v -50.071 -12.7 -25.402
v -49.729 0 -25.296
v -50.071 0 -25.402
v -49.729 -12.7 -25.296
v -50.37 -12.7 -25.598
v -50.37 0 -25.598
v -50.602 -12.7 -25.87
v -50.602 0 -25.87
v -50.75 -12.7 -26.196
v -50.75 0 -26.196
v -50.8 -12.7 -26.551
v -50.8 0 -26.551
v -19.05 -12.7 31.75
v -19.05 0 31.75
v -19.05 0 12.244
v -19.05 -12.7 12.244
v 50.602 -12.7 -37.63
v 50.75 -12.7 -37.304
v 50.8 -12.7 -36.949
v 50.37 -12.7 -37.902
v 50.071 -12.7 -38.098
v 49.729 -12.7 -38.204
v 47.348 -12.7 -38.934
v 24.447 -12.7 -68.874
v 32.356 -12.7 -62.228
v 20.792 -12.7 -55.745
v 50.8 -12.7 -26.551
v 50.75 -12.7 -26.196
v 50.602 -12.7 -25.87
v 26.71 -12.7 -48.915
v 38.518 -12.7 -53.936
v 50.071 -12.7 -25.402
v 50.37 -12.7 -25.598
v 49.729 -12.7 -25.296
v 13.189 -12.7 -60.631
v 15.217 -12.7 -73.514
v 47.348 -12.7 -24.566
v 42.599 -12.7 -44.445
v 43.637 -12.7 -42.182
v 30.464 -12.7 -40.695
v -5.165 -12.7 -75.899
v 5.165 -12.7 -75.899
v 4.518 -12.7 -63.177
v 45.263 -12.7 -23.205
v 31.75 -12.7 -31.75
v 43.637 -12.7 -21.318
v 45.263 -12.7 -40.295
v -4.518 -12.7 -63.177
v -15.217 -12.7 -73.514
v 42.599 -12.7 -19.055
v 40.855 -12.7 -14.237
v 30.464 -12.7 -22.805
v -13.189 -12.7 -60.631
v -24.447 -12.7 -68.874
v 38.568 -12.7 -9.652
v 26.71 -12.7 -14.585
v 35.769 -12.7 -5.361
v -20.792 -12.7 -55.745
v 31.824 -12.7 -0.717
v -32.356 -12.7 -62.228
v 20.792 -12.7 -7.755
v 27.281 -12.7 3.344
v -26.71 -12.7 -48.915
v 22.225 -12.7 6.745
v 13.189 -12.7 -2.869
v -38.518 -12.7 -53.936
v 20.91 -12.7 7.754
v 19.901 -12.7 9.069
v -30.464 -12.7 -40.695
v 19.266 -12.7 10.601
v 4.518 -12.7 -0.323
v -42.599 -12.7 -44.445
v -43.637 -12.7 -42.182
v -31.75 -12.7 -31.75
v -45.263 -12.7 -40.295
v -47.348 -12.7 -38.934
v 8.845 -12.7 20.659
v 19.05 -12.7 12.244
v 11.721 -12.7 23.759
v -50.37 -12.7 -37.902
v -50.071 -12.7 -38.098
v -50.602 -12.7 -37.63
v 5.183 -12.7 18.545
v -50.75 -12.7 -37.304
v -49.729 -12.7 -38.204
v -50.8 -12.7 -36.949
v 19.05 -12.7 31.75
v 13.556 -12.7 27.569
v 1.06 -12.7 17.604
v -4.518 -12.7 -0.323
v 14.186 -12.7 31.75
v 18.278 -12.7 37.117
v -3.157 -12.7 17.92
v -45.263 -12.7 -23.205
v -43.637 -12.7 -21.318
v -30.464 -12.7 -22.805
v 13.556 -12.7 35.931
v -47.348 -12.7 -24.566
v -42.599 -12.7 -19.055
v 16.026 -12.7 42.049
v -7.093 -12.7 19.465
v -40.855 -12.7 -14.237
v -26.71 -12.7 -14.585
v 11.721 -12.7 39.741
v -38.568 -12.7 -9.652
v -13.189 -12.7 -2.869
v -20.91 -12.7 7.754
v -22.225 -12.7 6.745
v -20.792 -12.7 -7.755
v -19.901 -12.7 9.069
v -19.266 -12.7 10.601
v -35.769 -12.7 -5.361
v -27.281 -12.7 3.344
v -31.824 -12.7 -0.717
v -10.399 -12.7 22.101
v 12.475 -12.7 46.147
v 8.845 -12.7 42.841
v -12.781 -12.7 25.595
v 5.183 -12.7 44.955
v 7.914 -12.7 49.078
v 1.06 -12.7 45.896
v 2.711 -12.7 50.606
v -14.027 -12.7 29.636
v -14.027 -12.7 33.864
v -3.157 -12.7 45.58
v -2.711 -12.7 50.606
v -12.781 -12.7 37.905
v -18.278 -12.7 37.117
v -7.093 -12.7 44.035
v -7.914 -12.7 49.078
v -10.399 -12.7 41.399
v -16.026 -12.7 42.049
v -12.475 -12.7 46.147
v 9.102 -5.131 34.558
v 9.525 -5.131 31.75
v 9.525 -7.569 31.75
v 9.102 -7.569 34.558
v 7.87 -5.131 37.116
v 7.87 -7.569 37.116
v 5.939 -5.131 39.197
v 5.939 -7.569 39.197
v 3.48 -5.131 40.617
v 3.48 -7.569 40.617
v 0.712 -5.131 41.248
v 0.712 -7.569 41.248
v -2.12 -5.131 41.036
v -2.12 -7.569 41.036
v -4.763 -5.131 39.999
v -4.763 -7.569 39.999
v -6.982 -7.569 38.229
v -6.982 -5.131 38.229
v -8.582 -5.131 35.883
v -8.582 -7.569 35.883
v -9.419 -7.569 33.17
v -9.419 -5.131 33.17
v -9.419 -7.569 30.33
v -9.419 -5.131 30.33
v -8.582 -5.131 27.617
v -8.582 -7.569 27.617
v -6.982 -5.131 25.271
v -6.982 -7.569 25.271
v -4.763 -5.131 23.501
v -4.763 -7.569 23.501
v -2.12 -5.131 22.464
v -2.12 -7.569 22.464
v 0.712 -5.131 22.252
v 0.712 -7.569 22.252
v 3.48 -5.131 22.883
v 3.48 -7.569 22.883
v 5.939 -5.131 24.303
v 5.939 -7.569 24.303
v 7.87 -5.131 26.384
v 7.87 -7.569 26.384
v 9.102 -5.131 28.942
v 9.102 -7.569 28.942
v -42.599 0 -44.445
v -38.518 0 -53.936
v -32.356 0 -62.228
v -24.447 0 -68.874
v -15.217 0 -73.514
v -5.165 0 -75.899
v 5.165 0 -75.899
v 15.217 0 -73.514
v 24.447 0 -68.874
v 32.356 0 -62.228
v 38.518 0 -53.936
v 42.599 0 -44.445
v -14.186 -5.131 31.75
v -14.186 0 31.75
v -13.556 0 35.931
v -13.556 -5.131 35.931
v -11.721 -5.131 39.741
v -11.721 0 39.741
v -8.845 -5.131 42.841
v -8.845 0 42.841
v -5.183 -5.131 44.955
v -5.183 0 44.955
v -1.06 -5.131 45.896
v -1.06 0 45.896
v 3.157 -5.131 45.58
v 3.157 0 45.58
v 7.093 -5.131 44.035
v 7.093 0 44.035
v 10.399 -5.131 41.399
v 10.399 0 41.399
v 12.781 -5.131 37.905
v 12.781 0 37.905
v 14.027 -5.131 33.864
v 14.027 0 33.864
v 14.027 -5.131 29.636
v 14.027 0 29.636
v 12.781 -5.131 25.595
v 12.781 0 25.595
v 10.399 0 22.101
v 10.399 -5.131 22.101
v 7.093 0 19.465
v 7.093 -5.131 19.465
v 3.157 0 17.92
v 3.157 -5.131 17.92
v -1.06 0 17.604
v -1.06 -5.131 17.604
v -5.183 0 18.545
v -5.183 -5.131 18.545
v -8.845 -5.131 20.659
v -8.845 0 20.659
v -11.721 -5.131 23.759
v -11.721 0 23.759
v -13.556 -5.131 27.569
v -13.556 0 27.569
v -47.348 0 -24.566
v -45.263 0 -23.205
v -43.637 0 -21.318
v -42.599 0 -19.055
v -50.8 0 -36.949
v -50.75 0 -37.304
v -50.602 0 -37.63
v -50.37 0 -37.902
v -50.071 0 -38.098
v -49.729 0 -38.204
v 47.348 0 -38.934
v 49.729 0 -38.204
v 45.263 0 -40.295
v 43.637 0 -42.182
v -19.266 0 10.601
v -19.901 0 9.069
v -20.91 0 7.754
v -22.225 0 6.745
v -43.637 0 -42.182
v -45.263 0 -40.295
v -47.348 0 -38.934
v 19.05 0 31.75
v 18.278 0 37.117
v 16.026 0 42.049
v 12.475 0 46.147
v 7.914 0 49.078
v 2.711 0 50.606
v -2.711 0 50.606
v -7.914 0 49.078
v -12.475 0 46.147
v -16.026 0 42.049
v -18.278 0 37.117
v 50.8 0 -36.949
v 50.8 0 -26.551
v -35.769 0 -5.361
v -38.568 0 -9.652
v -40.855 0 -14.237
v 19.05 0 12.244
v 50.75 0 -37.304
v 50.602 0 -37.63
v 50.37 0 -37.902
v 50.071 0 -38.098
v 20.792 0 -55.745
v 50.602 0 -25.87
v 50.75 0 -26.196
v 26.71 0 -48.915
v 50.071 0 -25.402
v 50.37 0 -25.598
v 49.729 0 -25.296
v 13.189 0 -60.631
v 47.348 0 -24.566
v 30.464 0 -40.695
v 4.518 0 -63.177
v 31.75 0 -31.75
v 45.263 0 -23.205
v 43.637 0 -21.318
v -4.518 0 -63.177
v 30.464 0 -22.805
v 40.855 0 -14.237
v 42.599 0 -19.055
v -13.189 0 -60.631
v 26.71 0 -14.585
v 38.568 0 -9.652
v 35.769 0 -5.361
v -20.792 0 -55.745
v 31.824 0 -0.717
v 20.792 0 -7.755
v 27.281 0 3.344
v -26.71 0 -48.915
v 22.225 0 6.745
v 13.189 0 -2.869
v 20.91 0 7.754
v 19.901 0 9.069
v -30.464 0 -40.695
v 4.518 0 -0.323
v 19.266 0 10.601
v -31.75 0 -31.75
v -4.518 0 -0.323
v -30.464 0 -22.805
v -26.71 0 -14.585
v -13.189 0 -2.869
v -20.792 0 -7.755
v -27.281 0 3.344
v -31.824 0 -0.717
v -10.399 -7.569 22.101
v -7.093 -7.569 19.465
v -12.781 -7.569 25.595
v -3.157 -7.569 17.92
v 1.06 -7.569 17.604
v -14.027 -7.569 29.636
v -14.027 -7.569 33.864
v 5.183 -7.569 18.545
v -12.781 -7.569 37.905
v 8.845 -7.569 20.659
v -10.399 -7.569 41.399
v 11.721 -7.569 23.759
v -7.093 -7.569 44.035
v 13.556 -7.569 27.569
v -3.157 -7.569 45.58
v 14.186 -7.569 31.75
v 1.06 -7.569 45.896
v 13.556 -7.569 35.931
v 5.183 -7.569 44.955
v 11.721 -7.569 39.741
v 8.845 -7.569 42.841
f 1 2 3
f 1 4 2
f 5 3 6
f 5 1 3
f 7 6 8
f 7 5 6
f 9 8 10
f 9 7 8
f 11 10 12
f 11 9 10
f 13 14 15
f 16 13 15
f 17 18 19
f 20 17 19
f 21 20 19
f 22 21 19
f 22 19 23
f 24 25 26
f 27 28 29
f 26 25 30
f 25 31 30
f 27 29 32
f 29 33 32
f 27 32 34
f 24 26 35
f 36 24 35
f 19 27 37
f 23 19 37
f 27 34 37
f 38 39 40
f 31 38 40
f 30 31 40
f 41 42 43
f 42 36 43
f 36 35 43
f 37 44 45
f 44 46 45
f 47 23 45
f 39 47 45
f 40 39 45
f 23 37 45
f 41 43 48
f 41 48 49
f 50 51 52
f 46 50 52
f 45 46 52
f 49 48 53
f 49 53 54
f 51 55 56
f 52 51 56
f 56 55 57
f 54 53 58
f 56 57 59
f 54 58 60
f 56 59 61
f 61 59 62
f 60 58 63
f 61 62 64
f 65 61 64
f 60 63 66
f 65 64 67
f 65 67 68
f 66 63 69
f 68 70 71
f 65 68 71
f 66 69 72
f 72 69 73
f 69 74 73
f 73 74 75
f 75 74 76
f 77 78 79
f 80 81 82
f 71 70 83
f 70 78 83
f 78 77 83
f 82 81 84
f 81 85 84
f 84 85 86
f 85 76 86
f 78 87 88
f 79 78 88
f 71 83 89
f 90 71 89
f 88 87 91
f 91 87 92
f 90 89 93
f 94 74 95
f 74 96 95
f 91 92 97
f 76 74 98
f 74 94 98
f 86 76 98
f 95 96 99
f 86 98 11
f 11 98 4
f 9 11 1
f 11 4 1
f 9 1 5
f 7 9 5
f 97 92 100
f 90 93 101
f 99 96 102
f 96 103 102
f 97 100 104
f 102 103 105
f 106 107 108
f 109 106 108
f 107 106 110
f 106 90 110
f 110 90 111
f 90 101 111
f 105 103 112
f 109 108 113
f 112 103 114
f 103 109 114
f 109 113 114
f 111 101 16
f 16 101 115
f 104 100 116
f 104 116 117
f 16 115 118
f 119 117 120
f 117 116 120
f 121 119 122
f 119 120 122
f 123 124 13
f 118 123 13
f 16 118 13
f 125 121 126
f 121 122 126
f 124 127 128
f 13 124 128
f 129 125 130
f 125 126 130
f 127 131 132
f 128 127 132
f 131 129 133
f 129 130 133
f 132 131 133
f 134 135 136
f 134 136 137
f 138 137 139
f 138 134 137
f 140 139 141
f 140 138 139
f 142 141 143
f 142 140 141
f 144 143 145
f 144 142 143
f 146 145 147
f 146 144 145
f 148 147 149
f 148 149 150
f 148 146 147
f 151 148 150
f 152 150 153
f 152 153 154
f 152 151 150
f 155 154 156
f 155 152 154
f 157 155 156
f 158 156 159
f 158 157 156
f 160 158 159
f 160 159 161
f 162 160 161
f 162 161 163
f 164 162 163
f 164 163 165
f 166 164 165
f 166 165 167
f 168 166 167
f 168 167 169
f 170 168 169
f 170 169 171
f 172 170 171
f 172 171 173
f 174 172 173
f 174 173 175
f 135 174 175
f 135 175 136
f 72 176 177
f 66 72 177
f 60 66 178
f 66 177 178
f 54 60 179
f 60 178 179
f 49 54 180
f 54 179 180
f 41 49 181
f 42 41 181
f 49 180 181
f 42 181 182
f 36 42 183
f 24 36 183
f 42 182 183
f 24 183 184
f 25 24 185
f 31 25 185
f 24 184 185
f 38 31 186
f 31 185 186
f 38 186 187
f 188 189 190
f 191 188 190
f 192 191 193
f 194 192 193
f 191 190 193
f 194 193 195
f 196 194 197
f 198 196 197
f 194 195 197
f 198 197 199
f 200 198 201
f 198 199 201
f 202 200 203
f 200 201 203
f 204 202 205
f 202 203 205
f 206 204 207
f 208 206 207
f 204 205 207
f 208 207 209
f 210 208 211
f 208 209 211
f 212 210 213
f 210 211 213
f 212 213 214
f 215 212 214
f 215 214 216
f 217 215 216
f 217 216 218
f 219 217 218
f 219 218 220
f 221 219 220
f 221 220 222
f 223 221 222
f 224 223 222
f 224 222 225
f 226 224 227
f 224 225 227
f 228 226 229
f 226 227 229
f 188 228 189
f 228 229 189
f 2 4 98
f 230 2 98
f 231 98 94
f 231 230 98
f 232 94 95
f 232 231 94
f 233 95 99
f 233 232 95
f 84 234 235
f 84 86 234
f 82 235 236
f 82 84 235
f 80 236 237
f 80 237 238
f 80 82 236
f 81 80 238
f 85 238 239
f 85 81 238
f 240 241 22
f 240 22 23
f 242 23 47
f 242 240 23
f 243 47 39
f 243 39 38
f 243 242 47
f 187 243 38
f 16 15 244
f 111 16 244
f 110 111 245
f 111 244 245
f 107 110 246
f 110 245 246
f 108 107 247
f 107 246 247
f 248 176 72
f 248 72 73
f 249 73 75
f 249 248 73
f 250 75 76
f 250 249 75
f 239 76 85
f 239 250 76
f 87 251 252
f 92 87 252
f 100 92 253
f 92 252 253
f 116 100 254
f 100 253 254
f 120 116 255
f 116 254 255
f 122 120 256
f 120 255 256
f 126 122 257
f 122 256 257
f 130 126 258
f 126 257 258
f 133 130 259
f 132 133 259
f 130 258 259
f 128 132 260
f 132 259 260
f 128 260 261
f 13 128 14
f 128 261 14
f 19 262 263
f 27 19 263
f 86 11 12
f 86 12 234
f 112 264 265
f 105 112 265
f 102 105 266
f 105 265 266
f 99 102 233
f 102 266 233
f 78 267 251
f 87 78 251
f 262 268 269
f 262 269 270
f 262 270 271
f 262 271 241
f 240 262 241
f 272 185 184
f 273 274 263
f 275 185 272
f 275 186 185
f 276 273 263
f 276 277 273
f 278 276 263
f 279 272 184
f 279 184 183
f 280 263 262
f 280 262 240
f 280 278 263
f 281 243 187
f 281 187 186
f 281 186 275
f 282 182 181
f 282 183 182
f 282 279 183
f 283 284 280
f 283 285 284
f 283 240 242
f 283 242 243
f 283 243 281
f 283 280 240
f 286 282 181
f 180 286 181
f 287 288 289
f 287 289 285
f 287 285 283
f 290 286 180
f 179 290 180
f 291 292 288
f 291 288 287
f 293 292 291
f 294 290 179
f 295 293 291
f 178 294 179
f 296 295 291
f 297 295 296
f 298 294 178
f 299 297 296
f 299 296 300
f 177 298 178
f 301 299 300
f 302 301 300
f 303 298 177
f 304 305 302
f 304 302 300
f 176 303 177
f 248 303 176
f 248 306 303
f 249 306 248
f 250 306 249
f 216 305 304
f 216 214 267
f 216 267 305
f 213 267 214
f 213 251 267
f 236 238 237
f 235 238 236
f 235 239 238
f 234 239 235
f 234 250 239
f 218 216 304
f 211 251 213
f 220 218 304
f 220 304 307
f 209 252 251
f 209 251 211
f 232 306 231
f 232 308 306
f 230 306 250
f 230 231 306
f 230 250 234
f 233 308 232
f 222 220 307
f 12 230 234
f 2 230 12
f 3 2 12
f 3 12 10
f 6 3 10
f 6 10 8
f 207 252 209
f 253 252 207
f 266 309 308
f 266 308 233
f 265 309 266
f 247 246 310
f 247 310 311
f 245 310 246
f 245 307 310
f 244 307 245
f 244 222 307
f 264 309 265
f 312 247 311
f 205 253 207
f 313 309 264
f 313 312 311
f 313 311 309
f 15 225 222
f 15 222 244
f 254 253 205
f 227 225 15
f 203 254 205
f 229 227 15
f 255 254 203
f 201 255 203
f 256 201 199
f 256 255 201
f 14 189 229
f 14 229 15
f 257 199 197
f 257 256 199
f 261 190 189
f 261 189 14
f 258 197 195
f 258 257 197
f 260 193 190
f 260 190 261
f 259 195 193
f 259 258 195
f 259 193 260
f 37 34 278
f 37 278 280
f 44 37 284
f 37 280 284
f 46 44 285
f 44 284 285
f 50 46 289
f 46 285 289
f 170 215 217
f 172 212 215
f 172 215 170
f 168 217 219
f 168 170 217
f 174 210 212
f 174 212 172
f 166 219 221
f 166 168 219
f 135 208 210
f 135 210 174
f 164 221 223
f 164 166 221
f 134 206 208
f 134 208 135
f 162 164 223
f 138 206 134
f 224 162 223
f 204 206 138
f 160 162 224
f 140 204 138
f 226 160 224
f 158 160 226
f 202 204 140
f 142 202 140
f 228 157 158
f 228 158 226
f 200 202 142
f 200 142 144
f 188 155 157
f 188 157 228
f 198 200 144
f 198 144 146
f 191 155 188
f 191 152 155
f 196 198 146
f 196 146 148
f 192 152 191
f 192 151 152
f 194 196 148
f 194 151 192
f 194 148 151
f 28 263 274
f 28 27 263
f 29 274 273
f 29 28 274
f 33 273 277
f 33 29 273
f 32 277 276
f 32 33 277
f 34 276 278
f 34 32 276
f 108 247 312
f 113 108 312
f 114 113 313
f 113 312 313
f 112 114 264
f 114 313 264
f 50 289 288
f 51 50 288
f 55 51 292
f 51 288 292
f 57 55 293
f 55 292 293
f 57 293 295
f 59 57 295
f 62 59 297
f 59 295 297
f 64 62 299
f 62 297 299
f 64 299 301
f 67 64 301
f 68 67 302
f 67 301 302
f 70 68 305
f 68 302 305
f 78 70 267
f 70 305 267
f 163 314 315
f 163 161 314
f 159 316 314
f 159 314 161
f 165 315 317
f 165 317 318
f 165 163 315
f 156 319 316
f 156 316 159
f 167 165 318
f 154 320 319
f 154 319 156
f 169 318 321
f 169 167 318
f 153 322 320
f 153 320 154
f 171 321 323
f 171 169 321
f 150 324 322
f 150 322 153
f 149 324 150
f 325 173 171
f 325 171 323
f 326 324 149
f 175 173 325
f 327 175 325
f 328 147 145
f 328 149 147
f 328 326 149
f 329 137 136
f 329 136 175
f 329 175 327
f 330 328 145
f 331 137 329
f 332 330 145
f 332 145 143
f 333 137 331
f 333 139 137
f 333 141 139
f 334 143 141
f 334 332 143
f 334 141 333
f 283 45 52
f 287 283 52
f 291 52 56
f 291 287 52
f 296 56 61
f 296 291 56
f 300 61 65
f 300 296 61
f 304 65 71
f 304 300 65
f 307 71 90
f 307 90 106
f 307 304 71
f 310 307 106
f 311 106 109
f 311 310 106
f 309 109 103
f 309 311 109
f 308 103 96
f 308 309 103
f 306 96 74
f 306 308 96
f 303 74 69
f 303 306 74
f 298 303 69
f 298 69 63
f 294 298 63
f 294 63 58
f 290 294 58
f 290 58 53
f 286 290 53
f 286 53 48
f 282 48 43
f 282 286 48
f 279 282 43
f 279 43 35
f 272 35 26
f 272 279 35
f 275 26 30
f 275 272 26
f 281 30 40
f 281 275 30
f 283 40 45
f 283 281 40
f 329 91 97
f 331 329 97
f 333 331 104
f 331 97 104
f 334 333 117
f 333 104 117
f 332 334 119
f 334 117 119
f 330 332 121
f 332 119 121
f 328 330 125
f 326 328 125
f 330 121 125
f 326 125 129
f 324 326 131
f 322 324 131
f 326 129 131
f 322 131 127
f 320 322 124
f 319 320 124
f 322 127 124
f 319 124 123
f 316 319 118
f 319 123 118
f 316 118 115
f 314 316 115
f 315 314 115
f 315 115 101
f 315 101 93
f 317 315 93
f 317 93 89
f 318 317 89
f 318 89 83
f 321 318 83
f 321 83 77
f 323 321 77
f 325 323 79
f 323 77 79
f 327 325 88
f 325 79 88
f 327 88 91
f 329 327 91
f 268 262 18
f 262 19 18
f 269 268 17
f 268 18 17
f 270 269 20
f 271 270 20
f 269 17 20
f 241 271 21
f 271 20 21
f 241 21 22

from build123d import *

# Parameters (mm, degrees)
F0_R        = 31.75
F0_R_2      = 9.525
F1_DEPTH    = 12.7
F2_T1_DEPTH = 12.7
F3_R        = 1.27
F4_R        = 14.1859
F4_R_2      = 9.525
F5_DEPTH    = 5.1308
F6_R        = 14.1859
F6_R_2      = 9.525
F7_DEPTH    = 5.1308


# Not quite as in the source:
# - a fillet or chamfer that OpenCascade refuses, or shapes differently, is made with other operations: its cross-section is extruded or revolved along the edge and cut away or added


with BuildPart() as f1:
    # F0 (on Front) → F1 (new body)
    with BuildSketch(Plane.XZ):
        with BuildLine():
            Line((19.05, 12.2440905122), (19.05, 31.75))
            ThreePointArc((19.05, 31.75), (0, 50.8), (-19.05, 31.75))
            Line((-19.05, 31.75), (-19.05, 12.2440905122))
            ThreePointArc((-19.05, 12.2440905122), (-19.900738686, 9.0690905122), (-22.225, 6.7448291982))
            ThreePointArc((-22.225, 6.7448291982), (-29.6221228011, 1.3910974586), (-35.7691769709, -5.3612054307))
            ThreePointArc((-35.7691769709, -5.3612054307), (-41.1209561154, -14.8719234463), (-43.9940905122, -25.4))
            Line((-43.9940905122, -25.4), (-50.8, -25.4))
            Line((-50.8, -25.4), (-50.8, -38.1))
            Line((-50.8, -38.1), (-43.9940905122, -38.1))
            ThreePointArc((-43.9940905122, -38.1), (0, -76.2), (43.9940905122, -38.1))
            Line((43.9940905122, -38.1), (50.8, -38.1))
            Line((50.8, -38.1), (50.8, -25.4))
            Line((50.8, -25.4), (43.9940905122, -25.4))
            ThreePointArc((43.9940905122, -25.4), (41.1209561154, -14.8719234463), (35.7691769709, -5.3612054307))
            ThreePointArc((35.7691769709, -5.3612054307), (29.6221228011, 1.3910974586), (22.225, 6.7448291982))
            ThreePointArc((22.225, 6.7448291982), (19.900738686, 9.0690905122), (19.05, 12.2440905122))
        make_face()
        with Locations((0, -31.75)):
            Circle(F0_R, mode=Mode.SUBTRACT)
        with Locations((0, 31.75)):
            Circle(F0_R_2, mode=Mode.SUBTRACT)
    extrude(amount=F1_DEPTH)

    # F2: fillet of radius 8.89 on 4 edges, made by hand

    # F2_s2 → F2_t1 (join)
    with BuildSketch(Plane.XZ):
        with BuildLine():
            ThreePointArc((-50.8, -25.4), (-45.6782912458, -23.5470098171), (-42.5985100968, -19.0547474412))
            ThreePointArc((-42.5985100968, -19.0547474412), (-43.4123850712, -22.2018419352), (-43.9940905122, -25.4))
            Line((-43.9940905122, -25.4), (-50.8, -25.4))
        make_face()
        with BuildLine():
            ThreePointArc((50.8, -25.4), (45.6782912458, -23.5470098171), (42.5985100968, -19.0547474412))
            ThreePointArc((42.5985100968, -19.0547474412), (43.4123850712, -22.2018419352), (43.9940905122, -25.4))
            Line((43.9940905122, -25.4), (50.8, -25.4))
        make_face()
        with BuildLine():
            ThreePointArc((-42.5985100968, -44.4452525588), (-45.6782912458, -39.9529901829), (-50.8, -38.1))
            Line((-50.8, -38.1), (-43.9940905122, -38.1))
            ThreePointArc((-43.9940905122, -38.1), (-43.4123850712, -41.2981580648), (-42.5985100968, -44.4452525588))
        make_face()
        with BuildLine():
            ThreePointArc((50.8, -38.1), (45.6782912458, -39.9529901829), (42.5985100968, -44.4452525588))
            ThreePointArc((42.5985100968, -44.4452525588), (43.4123850712, -41.2981580648), (43.9940905122, -38.1))
            Line((43.9940905122, -38.1), (50.8, -38.1))
        make_face()
    extrude(amount=F2_T1_DEPTH)

    # F3
    f3_edges = [f1.edges().sort_by_distance(p)[0] for p in [
        (-50.8, -6.35, -25.4),
        (-50.8, -6.35, -38.1),
        (50.8, -6.35, -25.4),
        (50.8, -6.35, -38.1),
    ]]
    fillet(f3_edges, radius=F3_R)

    # F4 (on face) → F5 (cut)
    with BuildSketch(Plane.XZ.offset(12.7)):
        with Locations((0, 31.75)):
            Circle(F4_R)
        with Locations((0, 31.75)):
            Circle(F4_R_2, mode=Mode.SUBTRACT)
    extrude(amount=-F5_DEPTH, mode=Mode.SUBTRACT)

    # F6 (on face) → F7 (cut)
    with BuildSketch(Plane(origin=(0, 0, 0), x_dir=(-1, 0, 0), z_dir=(0, 1, 0))):
        with Locations((0, 31.75)):
            Circle(F6_R)
        with Locations((0, 31.75)):
            Circle(F6_R_2, mode=Mode.SUBTRACT)
    extrude(amount=-F7_DEPTH, mode=Mode.SUBTRACT)


solid = f1.part
